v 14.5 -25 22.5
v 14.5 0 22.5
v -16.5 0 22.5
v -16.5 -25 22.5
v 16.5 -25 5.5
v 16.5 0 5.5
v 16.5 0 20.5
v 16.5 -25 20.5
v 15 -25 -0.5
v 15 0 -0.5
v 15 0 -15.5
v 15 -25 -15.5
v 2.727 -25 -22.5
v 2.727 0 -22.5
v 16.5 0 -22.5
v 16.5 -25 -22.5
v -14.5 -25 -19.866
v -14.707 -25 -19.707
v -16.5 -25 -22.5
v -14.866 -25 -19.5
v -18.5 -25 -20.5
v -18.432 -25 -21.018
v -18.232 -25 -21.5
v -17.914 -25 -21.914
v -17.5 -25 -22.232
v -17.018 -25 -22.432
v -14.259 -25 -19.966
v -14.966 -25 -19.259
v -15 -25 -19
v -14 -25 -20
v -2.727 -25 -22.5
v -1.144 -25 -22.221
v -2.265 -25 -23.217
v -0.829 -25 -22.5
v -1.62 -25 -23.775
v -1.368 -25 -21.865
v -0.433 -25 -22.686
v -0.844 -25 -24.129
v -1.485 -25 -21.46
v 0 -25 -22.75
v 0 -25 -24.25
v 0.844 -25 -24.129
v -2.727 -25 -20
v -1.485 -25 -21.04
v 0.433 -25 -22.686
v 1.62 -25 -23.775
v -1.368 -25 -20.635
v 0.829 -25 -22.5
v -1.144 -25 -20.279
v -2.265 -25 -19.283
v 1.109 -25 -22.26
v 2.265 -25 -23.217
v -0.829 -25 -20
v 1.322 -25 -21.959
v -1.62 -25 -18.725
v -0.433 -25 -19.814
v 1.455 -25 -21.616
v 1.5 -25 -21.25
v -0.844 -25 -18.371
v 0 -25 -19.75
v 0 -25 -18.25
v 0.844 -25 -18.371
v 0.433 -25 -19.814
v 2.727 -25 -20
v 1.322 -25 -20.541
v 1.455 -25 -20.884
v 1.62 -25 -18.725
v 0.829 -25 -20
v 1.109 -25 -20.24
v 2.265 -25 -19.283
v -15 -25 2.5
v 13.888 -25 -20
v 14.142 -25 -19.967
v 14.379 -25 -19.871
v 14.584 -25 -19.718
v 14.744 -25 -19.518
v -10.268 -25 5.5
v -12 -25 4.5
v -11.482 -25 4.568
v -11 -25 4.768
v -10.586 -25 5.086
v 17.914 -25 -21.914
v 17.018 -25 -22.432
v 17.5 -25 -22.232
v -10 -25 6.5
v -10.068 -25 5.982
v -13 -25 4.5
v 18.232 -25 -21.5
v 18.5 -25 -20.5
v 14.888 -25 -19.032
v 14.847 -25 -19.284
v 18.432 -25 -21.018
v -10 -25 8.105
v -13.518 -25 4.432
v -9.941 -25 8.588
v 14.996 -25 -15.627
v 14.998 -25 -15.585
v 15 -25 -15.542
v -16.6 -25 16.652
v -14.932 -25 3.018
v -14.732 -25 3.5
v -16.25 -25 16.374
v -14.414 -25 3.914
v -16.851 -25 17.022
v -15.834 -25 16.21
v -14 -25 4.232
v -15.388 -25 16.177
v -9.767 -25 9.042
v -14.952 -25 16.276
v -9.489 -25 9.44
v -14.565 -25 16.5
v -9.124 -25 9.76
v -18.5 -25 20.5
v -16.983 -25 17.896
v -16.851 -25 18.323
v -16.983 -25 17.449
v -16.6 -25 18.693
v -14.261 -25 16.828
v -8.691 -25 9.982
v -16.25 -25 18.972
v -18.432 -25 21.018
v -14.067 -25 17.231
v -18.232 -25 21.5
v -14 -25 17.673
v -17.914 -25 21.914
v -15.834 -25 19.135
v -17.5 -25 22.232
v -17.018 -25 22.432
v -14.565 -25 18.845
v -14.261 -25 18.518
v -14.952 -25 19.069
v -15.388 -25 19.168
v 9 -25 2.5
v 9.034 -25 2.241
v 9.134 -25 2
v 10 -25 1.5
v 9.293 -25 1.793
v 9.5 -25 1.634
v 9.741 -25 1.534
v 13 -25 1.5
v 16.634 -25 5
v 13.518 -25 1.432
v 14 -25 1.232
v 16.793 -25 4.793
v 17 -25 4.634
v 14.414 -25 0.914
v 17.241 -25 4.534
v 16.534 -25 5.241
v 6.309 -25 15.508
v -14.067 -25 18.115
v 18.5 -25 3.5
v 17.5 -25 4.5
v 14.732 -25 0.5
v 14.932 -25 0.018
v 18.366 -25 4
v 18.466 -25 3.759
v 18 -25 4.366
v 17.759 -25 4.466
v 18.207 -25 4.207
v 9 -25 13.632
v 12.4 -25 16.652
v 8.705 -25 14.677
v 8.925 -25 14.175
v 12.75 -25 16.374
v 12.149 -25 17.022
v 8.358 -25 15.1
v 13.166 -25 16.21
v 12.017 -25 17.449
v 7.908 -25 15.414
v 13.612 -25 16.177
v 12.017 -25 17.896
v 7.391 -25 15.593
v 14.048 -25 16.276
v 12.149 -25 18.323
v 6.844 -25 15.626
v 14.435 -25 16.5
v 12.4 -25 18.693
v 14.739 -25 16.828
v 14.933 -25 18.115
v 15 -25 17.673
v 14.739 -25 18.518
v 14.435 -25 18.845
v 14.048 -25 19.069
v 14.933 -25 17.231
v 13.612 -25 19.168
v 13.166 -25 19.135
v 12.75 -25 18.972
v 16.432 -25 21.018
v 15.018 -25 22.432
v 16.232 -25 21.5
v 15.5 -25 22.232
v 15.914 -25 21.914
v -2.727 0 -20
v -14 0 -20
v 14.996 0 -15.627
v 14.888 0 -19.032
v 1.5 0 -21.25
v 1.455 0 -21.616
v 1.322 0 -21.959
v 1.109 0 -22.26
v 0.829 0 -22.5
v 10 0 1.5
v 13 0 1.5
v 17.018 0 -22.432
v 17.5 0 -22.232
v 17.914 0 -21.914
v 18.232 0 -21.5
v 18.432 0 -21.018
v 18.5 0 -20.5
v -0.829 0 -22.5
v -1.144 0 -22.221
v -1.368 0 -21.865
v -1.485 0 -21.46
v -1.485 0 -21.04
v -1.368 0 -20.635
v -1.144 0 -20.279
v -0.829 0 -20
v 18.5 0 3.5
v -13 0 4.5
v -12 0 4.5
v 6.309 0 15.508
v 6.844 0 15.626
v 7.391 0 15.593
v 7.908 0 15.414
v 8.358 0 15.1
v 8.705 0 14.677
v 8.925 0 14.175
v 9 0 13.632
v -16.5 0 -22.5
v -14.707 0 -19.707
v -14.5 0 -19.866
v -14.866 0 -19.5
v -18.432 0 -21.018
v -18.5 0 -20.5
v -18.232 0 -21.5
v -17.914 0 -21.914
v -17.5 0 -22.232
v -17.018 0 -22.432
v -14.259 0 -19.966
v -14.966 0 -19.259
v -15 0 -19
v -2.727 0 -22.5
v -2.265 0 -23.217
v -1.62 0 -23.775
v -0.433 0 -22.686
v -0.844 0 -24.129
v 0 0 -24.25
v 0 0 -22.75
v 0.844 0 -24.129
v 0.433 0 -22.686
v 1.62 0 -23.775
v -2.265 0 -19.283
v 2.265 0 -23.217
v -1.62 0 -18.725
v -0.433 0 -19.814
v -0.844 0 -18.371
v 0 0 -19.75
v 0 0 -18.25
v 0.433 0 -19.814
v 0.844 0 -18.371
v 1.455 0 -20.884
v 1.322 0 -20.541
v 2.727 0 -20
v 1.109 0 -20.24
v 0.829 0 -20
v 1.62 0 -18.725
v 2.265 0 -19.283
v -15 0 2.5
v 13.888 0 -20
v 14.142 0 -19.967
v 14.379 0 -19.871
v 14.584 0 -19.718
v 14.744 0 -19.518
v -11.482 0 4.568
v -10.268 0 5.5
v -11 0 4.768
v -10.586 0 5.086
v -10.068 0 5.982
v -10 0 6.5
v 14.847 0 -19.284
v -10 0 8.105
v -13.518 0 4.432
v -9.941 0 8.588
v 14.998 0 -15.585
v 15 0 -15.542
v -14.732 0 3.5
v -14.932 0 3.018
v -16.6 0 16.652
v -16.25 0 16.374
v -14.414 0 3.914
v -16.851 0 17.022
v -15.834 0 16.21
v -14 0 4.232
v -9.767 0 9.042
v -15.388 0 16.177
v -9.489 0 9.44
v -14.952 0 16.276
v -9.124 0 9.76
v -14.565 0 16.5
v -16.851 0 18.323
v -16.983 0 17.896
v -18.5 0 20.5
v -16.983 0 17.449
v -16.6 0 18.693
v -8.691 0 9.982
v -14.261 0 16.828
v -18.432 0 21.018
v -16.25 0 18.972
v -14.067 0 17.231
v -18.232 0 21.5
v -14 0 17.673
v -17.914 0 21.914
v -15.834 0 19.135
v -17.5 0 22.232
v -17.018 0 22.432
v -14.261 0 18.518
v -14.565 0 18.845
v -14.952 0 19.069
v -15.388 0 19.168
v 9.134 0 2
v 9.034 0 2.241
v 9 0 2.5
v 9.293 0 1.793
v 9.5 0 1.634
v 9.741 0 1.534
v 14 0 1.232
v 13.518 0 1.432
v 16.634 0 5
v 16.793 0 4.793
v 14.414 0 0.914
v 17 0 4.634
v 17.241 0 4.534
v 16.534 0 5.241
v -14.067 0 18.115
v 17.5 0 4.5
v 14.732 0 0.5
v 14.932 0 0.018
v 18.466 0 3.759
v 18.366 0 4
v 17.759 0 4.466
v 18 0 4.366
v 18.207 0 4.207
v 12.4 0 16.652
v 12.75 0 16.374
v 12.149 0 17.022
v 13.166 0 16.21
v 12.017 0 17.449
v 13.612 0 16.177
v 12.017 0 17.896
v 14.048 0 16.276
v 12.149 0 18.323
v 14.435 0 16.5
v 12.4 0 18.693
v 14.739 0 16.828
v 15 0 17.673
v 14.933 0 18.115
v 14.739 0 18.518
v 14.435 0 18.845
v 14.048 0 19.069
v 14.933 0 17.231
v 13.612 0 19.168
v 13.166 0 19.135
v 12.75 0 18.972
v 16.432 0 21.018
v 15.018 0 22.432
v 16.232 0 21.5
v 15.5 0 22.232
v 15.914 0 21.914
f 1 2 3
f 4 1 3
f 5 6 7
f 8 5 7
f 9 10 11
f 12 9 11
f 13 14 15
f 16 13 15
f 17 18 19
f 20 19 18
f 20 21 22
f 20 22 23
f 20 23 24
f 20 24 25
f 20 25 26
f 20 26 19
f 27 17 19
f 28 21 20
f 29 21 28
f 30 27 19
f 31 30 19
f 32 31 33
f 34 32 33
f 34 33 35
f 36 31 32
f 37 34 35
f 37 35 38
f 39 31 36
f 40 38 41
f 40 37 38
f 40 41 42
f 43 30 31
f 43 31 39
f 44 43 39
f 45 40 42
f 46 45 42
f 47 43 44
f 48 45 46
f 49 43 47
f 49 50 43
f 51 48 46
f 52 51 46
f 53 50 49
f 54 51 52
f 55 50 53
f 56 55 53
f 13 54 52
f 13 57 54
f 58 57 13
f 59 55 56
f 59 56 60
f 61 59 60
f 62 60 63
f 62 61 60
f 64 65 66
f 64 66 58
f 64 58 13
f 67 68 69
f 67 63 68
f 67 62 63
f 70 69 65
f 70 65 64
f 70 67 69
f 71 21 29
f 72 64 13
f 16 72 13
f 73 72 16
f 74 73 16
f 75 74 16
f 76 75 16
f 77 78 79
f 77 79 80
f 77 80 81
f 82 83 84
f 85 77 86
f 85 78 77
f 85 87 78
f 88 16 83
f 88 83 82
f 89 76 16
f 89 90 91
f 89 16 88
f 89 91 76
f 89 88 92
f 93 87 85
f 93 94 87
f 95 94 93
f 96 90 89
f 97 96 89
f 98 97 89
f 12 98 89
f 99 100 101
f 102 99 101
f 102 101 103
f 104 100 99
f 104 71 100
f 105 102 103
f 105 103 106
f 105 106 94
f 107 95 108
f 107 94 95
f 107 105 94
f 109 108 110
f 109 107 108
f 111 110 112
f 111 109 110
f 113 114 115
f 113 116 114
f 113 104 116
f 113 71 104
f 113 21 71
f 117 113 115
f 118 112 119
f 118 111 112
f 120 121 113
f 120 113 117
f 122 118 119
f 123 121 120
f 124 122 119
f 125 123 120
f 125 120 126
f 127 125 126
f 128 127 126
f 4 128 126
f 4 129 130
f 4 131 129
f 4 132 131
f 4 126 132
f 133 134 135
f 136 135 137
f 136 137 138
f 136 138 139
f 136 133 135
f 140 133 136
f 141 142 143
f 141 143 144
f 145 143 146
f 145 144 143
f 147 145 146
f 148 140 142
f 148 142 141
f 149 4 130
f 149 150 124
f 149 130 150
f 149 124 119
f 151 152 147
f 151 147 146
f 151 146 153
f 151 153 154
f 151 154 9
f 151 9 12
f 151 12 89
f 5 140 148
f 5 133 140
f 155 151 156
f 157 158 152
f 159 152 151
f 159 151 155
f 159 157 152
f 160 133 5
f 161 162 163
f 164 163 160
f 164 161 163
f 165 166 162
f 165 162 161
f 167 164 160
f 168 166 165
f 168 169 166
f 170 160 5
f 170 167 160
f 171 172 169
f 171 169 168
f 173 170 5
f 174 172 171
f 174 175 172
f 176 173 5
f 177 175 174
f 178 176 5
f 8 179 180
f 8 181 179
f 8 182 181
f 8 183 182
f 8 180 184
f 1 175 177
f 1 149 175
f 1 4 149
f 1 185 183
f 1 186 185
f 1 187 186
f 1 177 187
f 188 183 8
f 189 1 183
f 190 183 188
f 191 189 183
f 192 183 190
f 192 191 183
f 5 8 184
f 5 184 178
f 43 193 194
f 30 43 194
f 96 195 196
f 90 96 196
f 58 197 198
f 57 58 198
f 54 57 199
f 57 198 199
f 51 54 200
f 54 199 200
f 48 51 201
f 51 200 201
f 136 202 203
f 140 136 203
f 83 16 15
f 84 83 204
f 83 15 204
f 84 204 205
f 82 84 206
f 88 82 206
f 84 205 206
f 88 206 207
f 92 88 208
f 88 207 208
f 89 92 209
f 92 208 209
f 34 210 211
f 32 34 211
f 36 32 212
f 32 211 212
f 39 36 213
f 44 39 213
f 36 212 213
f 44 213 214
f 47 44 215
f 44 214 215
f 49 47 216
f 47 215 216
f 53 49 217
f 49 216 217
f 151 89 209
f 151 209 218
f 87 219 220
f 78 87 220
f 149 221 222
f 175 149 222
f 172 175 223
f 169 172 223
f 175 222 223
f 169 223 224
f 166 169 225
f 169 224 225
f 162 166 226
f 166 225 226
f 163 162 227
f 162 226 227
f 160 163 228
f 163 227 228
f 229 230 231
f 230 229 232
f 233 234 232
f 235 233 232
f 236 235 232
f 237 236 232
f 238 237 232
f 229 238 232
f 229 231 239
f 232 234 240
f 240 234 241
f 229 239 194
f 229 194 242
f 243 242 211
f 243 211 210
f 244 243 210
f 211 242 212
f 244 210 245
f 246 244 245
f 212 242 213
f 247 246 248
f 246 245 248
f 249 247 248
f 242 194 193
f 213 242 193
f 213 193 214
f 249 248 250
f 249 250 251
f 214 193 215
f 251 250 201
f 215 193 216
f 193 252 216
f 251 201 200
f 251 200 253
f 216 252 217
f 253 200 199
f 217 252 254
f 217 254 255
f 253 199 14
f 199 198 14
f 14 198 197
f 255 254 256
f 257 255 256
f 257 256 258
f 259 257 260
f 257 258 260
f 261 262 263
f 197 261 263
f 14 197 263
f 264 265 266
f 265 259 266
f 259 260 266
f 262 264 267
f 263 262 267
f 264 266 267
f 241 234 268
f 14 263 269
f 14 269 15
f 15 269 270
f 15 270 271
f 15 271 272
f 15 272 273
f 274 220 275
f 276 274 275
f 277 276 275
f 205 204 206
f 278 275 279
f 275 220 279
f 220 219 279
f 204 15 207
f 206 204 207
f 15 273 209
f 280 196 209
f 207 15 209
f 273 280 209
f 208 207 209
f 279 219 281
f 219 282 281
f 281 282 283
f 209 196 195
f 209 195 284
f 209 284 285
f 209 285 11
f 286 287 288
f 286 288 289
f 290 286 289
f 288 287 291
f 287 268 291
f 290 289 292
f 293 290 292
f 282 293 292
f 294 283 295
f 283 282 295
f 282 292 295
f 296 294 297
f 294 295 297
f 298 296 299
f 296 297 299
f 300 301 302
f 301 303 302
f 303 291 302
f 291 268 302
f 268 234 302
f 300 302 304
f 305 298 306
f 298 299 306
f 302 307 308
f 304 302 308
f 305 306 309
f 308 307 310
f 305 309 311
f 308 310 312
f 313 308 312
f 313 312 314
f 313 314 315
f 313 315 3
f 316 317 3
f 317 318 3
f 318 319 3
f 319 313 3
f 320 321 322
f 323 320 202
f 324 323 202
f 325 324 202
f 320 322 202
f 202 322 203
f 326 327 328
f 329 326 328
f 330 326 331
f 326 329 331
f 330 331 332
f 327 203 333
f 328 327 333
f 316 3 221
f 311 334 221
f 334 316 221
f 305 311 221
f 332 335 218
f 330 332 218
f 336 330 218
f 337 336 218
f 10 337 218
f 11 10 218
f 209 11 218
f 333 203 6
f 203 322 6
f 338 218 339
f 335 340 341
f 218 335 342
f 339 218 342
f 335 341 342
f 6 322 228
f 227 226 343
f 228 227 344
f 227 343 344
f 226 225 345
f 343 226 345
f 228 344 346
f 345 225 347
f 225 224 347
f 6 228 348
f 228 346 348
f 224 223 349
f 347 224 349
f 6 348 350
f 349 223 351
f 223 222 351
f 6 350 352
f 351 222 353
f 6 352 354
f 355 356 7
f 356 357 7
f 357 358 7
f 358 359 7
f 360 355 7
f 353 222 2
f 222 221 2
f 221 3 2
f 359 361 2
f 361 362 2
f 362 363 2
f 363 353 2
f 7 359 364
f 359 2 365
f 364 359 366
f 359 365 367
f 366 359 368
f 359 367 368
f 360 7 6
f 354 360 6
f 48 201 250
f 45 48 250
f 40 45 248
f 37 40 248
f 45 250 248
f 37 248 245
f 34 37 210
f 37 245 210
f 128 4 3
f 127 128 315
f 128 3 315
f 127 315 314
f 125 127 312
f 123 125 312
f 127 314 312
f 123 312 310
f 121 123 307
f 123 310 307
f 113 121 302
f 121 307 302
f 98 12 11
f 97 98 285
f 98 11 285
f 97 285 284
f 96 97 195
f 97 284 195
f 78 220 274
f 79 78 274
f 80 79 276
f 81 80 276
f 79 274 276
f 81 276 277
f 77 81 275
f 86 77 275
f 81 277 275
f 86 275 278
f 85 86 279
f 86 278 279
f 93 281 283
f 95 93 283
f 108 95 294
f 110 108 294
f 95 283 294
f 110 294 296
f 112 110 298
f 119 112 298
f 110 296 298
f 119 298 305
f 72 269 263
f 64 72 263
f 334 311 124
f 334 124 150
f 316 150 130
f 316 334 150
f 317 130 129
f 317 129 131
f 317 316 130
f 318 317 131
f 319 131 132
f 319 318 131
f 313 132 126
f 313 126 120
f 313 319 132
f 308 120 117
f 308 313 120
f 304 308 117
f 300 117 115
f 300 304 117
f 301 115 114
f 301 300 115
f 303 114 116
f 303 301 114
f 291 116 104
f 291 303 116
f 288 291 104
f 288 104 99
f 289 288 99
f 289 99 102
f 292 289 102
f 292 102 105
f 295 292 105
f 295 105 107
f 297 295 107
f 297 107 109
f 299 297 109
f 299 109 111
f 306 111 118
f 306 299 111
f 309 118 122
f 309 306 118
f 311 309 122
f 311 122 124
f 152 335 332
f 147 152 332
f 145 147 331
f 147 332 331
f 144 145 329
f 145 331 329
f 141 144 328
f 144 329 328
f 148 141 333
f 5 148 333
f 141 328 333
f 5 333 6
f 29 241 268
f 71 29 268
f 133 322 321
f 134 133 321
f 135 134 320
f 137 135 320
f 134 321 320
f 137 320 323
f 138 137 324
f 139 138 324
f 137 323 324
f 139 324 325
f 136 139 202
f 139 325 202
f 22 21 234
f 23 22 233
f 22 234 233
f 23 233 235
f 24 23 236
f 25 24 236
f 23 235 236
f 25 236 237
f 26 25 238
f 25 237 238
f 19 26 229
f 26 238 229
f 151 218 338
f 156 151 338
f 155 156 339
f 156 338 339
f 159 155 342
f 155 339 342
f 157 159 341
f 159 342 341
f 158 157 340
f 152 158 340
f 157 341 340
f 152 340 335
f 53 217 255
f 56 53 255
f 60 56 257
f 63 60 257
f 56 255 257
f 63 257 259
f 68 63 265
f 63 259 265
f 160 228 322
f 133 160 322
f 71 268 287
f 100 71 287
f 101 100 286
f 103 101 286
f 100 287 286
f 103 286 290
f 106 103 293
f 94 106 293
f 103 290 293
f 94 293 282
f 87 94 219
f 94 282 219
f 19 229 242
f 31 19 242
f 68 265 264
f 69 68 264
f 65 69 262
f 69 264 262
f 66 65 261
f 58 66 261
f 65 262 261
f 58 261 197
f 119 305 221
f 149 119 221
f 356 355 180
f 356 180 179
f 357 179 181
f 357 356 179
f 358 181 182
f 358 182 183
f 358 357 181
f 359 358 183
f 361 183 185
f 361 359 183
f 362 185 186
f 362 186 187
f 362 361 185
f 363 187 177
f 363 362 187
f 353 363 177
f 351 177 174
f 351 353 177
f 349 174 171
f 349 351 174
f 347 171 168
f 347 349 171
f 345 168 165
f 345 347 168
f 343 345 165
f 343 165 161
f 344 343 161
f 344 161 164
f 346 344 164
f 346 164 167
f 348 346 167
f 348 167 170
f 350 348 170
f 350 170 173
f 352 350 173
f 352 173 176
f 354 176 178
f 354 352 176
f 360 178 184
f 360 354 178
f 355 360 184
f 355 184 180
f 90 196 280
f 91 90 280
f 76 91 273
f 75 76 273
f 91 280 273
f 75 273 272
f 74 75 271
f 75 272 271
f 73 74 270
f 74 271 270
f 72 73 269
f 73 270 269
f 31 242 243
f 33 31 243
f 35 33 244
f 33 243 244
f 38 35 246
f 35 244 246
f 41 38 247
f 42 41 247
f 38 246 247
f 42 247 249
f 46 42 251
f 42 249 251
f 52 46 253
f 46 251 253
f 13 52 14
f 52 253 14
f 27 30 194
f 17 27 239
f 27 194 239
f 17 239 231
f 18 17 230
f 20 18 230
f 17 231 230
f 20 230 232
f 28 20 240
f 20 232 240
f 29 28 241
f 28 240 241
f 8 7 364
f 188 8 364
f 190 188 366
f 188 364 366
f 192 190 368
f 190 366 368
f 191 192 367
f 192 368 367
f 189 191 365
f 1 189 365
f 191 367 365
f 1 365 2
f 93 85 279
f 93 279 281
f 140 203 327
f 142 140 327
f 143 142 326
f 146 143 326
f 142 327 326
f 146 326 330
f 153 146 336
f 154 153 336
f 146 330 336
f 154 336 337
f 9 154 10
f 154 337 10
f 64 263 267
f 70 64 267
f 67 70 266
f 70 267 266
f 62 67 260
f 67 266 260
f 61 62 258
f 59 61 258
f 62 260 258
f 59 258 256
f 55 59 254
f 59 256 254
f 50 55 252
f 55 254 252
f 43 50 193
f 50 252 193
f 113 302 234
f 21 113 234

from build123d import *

# Parameters (mm, degrees)
F0_R     = 3
F0_R_2   = 1.5
F1_DEPTH = 25


with BuildPart() as f1:
    # F0 (on Front) → F1 (new body)
    with BuildSketch(Plane.XZ):
        with BuildLine():
            Line((14.5, 22.5), (-16.5, 22.5))
            ThreePointArc((-16.5, 22.5), (-17.9142135624, 21.9142135624), (-18.5, 20.5))
            Line((-18.5, 20.5), (-18.5, 17.6726558901))
            Line((-18.5, 17.6726558901), (-18.5, -20.5))
            ThreePointArc((-18.5, -20.5), (-17.9142135624, -21.9142135624), (-16.5, -22.5))
            Line((-16.5, -22.5), (-2.7271780287, -22.5))
            ThreePointArc((-2.7271780287, -22.5), (-3, -21.25), (-2.7271780287, -20))
            Line((-2.7271780287, -20), (-14, -20))
            ThreePointArc((-14, -20), (-14.7071067812, -19.7071067812), (-15, -19))
            Line((-15, -19), (-15, -15.5))
            Line((-15, -15.5), (-15, 2.5))
            ThreePointArc((-15, 2.5), (-14.4142135624, 3.9142135624), (-13, 4.5))
            Line((-13, 4.5), (-12, 4.5))
            ThreePointArc((-12, 4.5), (-10.5857864376, 5.0857864376), (-10, 6.5))
            Line((-10, 6.5), (-10, 8.1054256072))
            ThreePointArc((-10, 8.1054256072), (-9.6405519552, 9.2493614806), (-8.6914107177, 9.9821118409))
            Line((-8.6914107177, 9.9821118409), (6.3085892823, 15.5084276303))
            ThreePointArc((6.3085892823, 15.5084276303), (8.1439358734, 15.2722933519), (9, 13.6317413967))
            Line((9, 13.6317413967), (9, 2.5))
            ThreePointArc((9, 2.5), (9.2928932188, 1.7928932188), (10, 1.5))
            Line((10, 1.5), (13, 1.5))
            ThreePointArc((13, 1.5), (14.4142135624, 0.9142135624), (15, -0.5))
            Line((15, -0.5), (15, -15.5))
            ThreePointArc((15, -15.5), (14.9989931779, -15.5634529316), (14.9959737255, -15.6268419774))
            Line((14.9959737255, -15.6268419774), (14.8878943659, -19.0317264658))
            ThreePointArc((14.8878943659, -19.0317264658), (14.5841971496, -19.7182361958), (13.8883977769, -20))
            Line((13.8883977769, -20), (2.7271780287, -20))
            ThreePointArc((2.7271780287, -20), (2.9310010309, -20.6102868166), (3, -21.25))
            ThreePointArc((3, -21.25), (2.9310010309, -21.8897131834), (2.7271780287, -22.5))
            Line((2.7271780287, -22.5), (16.5, -22.5))
            ThreePointArc((16.5, -22.5), (17.9142135624, -21.9142135624), (18.5, -20.5))
            Line((18.5, -20.5), (18.5, 3.5))
            ThreePointArc((18.5, 3.5), (18.2071067812, 4.2071067812), (17.5, 4.5))
            ThreePointArc((17.5, 4.5), (16.7928932188, 4.7928932188), (16.5, 5.5))
            Line((16.5, 5.5), (16.5, 17.6726558901))
            Line((16.5, 17.6726558901), (16.5, 20.5))
            ThreePointArc((16.5, 20.5), (15.9142135624, 21.9142135624), (14.5, 22.5))
        make_face()
        with BuildLine():
            ThreePointArc((-12.5, 17.6726558901), (-15.5, 14.6726558901), (-18.5, 17.6726558901))
            ThreePointArc((-18.5, 17.6726558901), (-15.5, 20.6726558901), (-12.5, 17.6726558901))
        make_face(mode=Mode.SUBTRACT)
        with Locations((13.5, 17.6726558901)):
            Circle(F0_R, mode=Mode.SUBTRACT)
        with BuildLine():
            ThreePointArc((-2.7271780287, -20), (-3, -21.25), (-2.7271780287, -22.5))
            Line((-2.7271780287, -22.5), (-0.8291561976, -22.5))
            ThreePointArc((-0.8291561976, -22.5), (-1.5, -21.25), (-0.8291561976, -20))
            Line((-0.8291561976, -20), (-2.7271780287, -20))
        make_face()
        with BuildLine():
            Line((-0.8291561976, -22.5), (-2.7271780287, -22.5))
            ThreePointArc((-2.7271780287, -22.5), (0, -24.25), (2.7271780287, -22.5))
            Line((2.7271780287, -22.5), (0.8291561976, -22.5))
            ThreePointArc((0.8291561976, -22.5), (0, -22.75), (-0.8291561976, -22.5))
        make_face()
        with BuildLine():
            Line((0.8291561976, -22.5), (2.7271780287, -22.5))
            ThreePointArc((2.7271780287, -22.5), (2.9310010309, -21.8897131834), (3, -21.25))
            ThreePointArc((3, -21.25), (2.9310010309, -20.6102868166), (2.7271780287, -20))
            Line((2.7271780287, -20), (0.8291561976, -20))
            ThreePointArc((0.8291561976, -20), (1.3216910184, -20.5406814173), (1.5, -21.25))
            ThreePointArc((1.5, -21.25), (1.3216910184, -21.9593185827), (0.8291561976, -22.5))
        make_face()
        with BuildLine():
            ThreePointArc((2.7271780287, -20), (0, -18.25), (-2.7271780287, -20))
            Line((-2.7271780287, -20), (-0.8291561976, -20))
            ThreePointArc((-0.8291561976, -20), (0, -19.75), (0.8291561976, -20))
            Line((0.8291561976, -20), (2.7271780287, -20))
        make_face()
        with BuildLine():
            ThreePointArc((-12.5, 17.6726558901), (-15.5, 20.6726558901), (-18.5, 17.6726558901))
            ThreePointArc((-18.5, 17.6726558901), (-15.5, 14.6726558901), (-12.5, 17.6726558901))
        make_face()
        with Locations((-15.5, 17.6726558901)):
            Circle(F0_R_2, mode=Mode.SUBTRACT)
        with Locations((13.5, 17.6726558901)):
            Circle(F0_R)
        with Locations((13.5, 17.6726558901)):
            Circle(F0_R_2, mode=Mode.SUBTRACT)
    extrude(amount=F1_DEPTH)


solid = f1.part
